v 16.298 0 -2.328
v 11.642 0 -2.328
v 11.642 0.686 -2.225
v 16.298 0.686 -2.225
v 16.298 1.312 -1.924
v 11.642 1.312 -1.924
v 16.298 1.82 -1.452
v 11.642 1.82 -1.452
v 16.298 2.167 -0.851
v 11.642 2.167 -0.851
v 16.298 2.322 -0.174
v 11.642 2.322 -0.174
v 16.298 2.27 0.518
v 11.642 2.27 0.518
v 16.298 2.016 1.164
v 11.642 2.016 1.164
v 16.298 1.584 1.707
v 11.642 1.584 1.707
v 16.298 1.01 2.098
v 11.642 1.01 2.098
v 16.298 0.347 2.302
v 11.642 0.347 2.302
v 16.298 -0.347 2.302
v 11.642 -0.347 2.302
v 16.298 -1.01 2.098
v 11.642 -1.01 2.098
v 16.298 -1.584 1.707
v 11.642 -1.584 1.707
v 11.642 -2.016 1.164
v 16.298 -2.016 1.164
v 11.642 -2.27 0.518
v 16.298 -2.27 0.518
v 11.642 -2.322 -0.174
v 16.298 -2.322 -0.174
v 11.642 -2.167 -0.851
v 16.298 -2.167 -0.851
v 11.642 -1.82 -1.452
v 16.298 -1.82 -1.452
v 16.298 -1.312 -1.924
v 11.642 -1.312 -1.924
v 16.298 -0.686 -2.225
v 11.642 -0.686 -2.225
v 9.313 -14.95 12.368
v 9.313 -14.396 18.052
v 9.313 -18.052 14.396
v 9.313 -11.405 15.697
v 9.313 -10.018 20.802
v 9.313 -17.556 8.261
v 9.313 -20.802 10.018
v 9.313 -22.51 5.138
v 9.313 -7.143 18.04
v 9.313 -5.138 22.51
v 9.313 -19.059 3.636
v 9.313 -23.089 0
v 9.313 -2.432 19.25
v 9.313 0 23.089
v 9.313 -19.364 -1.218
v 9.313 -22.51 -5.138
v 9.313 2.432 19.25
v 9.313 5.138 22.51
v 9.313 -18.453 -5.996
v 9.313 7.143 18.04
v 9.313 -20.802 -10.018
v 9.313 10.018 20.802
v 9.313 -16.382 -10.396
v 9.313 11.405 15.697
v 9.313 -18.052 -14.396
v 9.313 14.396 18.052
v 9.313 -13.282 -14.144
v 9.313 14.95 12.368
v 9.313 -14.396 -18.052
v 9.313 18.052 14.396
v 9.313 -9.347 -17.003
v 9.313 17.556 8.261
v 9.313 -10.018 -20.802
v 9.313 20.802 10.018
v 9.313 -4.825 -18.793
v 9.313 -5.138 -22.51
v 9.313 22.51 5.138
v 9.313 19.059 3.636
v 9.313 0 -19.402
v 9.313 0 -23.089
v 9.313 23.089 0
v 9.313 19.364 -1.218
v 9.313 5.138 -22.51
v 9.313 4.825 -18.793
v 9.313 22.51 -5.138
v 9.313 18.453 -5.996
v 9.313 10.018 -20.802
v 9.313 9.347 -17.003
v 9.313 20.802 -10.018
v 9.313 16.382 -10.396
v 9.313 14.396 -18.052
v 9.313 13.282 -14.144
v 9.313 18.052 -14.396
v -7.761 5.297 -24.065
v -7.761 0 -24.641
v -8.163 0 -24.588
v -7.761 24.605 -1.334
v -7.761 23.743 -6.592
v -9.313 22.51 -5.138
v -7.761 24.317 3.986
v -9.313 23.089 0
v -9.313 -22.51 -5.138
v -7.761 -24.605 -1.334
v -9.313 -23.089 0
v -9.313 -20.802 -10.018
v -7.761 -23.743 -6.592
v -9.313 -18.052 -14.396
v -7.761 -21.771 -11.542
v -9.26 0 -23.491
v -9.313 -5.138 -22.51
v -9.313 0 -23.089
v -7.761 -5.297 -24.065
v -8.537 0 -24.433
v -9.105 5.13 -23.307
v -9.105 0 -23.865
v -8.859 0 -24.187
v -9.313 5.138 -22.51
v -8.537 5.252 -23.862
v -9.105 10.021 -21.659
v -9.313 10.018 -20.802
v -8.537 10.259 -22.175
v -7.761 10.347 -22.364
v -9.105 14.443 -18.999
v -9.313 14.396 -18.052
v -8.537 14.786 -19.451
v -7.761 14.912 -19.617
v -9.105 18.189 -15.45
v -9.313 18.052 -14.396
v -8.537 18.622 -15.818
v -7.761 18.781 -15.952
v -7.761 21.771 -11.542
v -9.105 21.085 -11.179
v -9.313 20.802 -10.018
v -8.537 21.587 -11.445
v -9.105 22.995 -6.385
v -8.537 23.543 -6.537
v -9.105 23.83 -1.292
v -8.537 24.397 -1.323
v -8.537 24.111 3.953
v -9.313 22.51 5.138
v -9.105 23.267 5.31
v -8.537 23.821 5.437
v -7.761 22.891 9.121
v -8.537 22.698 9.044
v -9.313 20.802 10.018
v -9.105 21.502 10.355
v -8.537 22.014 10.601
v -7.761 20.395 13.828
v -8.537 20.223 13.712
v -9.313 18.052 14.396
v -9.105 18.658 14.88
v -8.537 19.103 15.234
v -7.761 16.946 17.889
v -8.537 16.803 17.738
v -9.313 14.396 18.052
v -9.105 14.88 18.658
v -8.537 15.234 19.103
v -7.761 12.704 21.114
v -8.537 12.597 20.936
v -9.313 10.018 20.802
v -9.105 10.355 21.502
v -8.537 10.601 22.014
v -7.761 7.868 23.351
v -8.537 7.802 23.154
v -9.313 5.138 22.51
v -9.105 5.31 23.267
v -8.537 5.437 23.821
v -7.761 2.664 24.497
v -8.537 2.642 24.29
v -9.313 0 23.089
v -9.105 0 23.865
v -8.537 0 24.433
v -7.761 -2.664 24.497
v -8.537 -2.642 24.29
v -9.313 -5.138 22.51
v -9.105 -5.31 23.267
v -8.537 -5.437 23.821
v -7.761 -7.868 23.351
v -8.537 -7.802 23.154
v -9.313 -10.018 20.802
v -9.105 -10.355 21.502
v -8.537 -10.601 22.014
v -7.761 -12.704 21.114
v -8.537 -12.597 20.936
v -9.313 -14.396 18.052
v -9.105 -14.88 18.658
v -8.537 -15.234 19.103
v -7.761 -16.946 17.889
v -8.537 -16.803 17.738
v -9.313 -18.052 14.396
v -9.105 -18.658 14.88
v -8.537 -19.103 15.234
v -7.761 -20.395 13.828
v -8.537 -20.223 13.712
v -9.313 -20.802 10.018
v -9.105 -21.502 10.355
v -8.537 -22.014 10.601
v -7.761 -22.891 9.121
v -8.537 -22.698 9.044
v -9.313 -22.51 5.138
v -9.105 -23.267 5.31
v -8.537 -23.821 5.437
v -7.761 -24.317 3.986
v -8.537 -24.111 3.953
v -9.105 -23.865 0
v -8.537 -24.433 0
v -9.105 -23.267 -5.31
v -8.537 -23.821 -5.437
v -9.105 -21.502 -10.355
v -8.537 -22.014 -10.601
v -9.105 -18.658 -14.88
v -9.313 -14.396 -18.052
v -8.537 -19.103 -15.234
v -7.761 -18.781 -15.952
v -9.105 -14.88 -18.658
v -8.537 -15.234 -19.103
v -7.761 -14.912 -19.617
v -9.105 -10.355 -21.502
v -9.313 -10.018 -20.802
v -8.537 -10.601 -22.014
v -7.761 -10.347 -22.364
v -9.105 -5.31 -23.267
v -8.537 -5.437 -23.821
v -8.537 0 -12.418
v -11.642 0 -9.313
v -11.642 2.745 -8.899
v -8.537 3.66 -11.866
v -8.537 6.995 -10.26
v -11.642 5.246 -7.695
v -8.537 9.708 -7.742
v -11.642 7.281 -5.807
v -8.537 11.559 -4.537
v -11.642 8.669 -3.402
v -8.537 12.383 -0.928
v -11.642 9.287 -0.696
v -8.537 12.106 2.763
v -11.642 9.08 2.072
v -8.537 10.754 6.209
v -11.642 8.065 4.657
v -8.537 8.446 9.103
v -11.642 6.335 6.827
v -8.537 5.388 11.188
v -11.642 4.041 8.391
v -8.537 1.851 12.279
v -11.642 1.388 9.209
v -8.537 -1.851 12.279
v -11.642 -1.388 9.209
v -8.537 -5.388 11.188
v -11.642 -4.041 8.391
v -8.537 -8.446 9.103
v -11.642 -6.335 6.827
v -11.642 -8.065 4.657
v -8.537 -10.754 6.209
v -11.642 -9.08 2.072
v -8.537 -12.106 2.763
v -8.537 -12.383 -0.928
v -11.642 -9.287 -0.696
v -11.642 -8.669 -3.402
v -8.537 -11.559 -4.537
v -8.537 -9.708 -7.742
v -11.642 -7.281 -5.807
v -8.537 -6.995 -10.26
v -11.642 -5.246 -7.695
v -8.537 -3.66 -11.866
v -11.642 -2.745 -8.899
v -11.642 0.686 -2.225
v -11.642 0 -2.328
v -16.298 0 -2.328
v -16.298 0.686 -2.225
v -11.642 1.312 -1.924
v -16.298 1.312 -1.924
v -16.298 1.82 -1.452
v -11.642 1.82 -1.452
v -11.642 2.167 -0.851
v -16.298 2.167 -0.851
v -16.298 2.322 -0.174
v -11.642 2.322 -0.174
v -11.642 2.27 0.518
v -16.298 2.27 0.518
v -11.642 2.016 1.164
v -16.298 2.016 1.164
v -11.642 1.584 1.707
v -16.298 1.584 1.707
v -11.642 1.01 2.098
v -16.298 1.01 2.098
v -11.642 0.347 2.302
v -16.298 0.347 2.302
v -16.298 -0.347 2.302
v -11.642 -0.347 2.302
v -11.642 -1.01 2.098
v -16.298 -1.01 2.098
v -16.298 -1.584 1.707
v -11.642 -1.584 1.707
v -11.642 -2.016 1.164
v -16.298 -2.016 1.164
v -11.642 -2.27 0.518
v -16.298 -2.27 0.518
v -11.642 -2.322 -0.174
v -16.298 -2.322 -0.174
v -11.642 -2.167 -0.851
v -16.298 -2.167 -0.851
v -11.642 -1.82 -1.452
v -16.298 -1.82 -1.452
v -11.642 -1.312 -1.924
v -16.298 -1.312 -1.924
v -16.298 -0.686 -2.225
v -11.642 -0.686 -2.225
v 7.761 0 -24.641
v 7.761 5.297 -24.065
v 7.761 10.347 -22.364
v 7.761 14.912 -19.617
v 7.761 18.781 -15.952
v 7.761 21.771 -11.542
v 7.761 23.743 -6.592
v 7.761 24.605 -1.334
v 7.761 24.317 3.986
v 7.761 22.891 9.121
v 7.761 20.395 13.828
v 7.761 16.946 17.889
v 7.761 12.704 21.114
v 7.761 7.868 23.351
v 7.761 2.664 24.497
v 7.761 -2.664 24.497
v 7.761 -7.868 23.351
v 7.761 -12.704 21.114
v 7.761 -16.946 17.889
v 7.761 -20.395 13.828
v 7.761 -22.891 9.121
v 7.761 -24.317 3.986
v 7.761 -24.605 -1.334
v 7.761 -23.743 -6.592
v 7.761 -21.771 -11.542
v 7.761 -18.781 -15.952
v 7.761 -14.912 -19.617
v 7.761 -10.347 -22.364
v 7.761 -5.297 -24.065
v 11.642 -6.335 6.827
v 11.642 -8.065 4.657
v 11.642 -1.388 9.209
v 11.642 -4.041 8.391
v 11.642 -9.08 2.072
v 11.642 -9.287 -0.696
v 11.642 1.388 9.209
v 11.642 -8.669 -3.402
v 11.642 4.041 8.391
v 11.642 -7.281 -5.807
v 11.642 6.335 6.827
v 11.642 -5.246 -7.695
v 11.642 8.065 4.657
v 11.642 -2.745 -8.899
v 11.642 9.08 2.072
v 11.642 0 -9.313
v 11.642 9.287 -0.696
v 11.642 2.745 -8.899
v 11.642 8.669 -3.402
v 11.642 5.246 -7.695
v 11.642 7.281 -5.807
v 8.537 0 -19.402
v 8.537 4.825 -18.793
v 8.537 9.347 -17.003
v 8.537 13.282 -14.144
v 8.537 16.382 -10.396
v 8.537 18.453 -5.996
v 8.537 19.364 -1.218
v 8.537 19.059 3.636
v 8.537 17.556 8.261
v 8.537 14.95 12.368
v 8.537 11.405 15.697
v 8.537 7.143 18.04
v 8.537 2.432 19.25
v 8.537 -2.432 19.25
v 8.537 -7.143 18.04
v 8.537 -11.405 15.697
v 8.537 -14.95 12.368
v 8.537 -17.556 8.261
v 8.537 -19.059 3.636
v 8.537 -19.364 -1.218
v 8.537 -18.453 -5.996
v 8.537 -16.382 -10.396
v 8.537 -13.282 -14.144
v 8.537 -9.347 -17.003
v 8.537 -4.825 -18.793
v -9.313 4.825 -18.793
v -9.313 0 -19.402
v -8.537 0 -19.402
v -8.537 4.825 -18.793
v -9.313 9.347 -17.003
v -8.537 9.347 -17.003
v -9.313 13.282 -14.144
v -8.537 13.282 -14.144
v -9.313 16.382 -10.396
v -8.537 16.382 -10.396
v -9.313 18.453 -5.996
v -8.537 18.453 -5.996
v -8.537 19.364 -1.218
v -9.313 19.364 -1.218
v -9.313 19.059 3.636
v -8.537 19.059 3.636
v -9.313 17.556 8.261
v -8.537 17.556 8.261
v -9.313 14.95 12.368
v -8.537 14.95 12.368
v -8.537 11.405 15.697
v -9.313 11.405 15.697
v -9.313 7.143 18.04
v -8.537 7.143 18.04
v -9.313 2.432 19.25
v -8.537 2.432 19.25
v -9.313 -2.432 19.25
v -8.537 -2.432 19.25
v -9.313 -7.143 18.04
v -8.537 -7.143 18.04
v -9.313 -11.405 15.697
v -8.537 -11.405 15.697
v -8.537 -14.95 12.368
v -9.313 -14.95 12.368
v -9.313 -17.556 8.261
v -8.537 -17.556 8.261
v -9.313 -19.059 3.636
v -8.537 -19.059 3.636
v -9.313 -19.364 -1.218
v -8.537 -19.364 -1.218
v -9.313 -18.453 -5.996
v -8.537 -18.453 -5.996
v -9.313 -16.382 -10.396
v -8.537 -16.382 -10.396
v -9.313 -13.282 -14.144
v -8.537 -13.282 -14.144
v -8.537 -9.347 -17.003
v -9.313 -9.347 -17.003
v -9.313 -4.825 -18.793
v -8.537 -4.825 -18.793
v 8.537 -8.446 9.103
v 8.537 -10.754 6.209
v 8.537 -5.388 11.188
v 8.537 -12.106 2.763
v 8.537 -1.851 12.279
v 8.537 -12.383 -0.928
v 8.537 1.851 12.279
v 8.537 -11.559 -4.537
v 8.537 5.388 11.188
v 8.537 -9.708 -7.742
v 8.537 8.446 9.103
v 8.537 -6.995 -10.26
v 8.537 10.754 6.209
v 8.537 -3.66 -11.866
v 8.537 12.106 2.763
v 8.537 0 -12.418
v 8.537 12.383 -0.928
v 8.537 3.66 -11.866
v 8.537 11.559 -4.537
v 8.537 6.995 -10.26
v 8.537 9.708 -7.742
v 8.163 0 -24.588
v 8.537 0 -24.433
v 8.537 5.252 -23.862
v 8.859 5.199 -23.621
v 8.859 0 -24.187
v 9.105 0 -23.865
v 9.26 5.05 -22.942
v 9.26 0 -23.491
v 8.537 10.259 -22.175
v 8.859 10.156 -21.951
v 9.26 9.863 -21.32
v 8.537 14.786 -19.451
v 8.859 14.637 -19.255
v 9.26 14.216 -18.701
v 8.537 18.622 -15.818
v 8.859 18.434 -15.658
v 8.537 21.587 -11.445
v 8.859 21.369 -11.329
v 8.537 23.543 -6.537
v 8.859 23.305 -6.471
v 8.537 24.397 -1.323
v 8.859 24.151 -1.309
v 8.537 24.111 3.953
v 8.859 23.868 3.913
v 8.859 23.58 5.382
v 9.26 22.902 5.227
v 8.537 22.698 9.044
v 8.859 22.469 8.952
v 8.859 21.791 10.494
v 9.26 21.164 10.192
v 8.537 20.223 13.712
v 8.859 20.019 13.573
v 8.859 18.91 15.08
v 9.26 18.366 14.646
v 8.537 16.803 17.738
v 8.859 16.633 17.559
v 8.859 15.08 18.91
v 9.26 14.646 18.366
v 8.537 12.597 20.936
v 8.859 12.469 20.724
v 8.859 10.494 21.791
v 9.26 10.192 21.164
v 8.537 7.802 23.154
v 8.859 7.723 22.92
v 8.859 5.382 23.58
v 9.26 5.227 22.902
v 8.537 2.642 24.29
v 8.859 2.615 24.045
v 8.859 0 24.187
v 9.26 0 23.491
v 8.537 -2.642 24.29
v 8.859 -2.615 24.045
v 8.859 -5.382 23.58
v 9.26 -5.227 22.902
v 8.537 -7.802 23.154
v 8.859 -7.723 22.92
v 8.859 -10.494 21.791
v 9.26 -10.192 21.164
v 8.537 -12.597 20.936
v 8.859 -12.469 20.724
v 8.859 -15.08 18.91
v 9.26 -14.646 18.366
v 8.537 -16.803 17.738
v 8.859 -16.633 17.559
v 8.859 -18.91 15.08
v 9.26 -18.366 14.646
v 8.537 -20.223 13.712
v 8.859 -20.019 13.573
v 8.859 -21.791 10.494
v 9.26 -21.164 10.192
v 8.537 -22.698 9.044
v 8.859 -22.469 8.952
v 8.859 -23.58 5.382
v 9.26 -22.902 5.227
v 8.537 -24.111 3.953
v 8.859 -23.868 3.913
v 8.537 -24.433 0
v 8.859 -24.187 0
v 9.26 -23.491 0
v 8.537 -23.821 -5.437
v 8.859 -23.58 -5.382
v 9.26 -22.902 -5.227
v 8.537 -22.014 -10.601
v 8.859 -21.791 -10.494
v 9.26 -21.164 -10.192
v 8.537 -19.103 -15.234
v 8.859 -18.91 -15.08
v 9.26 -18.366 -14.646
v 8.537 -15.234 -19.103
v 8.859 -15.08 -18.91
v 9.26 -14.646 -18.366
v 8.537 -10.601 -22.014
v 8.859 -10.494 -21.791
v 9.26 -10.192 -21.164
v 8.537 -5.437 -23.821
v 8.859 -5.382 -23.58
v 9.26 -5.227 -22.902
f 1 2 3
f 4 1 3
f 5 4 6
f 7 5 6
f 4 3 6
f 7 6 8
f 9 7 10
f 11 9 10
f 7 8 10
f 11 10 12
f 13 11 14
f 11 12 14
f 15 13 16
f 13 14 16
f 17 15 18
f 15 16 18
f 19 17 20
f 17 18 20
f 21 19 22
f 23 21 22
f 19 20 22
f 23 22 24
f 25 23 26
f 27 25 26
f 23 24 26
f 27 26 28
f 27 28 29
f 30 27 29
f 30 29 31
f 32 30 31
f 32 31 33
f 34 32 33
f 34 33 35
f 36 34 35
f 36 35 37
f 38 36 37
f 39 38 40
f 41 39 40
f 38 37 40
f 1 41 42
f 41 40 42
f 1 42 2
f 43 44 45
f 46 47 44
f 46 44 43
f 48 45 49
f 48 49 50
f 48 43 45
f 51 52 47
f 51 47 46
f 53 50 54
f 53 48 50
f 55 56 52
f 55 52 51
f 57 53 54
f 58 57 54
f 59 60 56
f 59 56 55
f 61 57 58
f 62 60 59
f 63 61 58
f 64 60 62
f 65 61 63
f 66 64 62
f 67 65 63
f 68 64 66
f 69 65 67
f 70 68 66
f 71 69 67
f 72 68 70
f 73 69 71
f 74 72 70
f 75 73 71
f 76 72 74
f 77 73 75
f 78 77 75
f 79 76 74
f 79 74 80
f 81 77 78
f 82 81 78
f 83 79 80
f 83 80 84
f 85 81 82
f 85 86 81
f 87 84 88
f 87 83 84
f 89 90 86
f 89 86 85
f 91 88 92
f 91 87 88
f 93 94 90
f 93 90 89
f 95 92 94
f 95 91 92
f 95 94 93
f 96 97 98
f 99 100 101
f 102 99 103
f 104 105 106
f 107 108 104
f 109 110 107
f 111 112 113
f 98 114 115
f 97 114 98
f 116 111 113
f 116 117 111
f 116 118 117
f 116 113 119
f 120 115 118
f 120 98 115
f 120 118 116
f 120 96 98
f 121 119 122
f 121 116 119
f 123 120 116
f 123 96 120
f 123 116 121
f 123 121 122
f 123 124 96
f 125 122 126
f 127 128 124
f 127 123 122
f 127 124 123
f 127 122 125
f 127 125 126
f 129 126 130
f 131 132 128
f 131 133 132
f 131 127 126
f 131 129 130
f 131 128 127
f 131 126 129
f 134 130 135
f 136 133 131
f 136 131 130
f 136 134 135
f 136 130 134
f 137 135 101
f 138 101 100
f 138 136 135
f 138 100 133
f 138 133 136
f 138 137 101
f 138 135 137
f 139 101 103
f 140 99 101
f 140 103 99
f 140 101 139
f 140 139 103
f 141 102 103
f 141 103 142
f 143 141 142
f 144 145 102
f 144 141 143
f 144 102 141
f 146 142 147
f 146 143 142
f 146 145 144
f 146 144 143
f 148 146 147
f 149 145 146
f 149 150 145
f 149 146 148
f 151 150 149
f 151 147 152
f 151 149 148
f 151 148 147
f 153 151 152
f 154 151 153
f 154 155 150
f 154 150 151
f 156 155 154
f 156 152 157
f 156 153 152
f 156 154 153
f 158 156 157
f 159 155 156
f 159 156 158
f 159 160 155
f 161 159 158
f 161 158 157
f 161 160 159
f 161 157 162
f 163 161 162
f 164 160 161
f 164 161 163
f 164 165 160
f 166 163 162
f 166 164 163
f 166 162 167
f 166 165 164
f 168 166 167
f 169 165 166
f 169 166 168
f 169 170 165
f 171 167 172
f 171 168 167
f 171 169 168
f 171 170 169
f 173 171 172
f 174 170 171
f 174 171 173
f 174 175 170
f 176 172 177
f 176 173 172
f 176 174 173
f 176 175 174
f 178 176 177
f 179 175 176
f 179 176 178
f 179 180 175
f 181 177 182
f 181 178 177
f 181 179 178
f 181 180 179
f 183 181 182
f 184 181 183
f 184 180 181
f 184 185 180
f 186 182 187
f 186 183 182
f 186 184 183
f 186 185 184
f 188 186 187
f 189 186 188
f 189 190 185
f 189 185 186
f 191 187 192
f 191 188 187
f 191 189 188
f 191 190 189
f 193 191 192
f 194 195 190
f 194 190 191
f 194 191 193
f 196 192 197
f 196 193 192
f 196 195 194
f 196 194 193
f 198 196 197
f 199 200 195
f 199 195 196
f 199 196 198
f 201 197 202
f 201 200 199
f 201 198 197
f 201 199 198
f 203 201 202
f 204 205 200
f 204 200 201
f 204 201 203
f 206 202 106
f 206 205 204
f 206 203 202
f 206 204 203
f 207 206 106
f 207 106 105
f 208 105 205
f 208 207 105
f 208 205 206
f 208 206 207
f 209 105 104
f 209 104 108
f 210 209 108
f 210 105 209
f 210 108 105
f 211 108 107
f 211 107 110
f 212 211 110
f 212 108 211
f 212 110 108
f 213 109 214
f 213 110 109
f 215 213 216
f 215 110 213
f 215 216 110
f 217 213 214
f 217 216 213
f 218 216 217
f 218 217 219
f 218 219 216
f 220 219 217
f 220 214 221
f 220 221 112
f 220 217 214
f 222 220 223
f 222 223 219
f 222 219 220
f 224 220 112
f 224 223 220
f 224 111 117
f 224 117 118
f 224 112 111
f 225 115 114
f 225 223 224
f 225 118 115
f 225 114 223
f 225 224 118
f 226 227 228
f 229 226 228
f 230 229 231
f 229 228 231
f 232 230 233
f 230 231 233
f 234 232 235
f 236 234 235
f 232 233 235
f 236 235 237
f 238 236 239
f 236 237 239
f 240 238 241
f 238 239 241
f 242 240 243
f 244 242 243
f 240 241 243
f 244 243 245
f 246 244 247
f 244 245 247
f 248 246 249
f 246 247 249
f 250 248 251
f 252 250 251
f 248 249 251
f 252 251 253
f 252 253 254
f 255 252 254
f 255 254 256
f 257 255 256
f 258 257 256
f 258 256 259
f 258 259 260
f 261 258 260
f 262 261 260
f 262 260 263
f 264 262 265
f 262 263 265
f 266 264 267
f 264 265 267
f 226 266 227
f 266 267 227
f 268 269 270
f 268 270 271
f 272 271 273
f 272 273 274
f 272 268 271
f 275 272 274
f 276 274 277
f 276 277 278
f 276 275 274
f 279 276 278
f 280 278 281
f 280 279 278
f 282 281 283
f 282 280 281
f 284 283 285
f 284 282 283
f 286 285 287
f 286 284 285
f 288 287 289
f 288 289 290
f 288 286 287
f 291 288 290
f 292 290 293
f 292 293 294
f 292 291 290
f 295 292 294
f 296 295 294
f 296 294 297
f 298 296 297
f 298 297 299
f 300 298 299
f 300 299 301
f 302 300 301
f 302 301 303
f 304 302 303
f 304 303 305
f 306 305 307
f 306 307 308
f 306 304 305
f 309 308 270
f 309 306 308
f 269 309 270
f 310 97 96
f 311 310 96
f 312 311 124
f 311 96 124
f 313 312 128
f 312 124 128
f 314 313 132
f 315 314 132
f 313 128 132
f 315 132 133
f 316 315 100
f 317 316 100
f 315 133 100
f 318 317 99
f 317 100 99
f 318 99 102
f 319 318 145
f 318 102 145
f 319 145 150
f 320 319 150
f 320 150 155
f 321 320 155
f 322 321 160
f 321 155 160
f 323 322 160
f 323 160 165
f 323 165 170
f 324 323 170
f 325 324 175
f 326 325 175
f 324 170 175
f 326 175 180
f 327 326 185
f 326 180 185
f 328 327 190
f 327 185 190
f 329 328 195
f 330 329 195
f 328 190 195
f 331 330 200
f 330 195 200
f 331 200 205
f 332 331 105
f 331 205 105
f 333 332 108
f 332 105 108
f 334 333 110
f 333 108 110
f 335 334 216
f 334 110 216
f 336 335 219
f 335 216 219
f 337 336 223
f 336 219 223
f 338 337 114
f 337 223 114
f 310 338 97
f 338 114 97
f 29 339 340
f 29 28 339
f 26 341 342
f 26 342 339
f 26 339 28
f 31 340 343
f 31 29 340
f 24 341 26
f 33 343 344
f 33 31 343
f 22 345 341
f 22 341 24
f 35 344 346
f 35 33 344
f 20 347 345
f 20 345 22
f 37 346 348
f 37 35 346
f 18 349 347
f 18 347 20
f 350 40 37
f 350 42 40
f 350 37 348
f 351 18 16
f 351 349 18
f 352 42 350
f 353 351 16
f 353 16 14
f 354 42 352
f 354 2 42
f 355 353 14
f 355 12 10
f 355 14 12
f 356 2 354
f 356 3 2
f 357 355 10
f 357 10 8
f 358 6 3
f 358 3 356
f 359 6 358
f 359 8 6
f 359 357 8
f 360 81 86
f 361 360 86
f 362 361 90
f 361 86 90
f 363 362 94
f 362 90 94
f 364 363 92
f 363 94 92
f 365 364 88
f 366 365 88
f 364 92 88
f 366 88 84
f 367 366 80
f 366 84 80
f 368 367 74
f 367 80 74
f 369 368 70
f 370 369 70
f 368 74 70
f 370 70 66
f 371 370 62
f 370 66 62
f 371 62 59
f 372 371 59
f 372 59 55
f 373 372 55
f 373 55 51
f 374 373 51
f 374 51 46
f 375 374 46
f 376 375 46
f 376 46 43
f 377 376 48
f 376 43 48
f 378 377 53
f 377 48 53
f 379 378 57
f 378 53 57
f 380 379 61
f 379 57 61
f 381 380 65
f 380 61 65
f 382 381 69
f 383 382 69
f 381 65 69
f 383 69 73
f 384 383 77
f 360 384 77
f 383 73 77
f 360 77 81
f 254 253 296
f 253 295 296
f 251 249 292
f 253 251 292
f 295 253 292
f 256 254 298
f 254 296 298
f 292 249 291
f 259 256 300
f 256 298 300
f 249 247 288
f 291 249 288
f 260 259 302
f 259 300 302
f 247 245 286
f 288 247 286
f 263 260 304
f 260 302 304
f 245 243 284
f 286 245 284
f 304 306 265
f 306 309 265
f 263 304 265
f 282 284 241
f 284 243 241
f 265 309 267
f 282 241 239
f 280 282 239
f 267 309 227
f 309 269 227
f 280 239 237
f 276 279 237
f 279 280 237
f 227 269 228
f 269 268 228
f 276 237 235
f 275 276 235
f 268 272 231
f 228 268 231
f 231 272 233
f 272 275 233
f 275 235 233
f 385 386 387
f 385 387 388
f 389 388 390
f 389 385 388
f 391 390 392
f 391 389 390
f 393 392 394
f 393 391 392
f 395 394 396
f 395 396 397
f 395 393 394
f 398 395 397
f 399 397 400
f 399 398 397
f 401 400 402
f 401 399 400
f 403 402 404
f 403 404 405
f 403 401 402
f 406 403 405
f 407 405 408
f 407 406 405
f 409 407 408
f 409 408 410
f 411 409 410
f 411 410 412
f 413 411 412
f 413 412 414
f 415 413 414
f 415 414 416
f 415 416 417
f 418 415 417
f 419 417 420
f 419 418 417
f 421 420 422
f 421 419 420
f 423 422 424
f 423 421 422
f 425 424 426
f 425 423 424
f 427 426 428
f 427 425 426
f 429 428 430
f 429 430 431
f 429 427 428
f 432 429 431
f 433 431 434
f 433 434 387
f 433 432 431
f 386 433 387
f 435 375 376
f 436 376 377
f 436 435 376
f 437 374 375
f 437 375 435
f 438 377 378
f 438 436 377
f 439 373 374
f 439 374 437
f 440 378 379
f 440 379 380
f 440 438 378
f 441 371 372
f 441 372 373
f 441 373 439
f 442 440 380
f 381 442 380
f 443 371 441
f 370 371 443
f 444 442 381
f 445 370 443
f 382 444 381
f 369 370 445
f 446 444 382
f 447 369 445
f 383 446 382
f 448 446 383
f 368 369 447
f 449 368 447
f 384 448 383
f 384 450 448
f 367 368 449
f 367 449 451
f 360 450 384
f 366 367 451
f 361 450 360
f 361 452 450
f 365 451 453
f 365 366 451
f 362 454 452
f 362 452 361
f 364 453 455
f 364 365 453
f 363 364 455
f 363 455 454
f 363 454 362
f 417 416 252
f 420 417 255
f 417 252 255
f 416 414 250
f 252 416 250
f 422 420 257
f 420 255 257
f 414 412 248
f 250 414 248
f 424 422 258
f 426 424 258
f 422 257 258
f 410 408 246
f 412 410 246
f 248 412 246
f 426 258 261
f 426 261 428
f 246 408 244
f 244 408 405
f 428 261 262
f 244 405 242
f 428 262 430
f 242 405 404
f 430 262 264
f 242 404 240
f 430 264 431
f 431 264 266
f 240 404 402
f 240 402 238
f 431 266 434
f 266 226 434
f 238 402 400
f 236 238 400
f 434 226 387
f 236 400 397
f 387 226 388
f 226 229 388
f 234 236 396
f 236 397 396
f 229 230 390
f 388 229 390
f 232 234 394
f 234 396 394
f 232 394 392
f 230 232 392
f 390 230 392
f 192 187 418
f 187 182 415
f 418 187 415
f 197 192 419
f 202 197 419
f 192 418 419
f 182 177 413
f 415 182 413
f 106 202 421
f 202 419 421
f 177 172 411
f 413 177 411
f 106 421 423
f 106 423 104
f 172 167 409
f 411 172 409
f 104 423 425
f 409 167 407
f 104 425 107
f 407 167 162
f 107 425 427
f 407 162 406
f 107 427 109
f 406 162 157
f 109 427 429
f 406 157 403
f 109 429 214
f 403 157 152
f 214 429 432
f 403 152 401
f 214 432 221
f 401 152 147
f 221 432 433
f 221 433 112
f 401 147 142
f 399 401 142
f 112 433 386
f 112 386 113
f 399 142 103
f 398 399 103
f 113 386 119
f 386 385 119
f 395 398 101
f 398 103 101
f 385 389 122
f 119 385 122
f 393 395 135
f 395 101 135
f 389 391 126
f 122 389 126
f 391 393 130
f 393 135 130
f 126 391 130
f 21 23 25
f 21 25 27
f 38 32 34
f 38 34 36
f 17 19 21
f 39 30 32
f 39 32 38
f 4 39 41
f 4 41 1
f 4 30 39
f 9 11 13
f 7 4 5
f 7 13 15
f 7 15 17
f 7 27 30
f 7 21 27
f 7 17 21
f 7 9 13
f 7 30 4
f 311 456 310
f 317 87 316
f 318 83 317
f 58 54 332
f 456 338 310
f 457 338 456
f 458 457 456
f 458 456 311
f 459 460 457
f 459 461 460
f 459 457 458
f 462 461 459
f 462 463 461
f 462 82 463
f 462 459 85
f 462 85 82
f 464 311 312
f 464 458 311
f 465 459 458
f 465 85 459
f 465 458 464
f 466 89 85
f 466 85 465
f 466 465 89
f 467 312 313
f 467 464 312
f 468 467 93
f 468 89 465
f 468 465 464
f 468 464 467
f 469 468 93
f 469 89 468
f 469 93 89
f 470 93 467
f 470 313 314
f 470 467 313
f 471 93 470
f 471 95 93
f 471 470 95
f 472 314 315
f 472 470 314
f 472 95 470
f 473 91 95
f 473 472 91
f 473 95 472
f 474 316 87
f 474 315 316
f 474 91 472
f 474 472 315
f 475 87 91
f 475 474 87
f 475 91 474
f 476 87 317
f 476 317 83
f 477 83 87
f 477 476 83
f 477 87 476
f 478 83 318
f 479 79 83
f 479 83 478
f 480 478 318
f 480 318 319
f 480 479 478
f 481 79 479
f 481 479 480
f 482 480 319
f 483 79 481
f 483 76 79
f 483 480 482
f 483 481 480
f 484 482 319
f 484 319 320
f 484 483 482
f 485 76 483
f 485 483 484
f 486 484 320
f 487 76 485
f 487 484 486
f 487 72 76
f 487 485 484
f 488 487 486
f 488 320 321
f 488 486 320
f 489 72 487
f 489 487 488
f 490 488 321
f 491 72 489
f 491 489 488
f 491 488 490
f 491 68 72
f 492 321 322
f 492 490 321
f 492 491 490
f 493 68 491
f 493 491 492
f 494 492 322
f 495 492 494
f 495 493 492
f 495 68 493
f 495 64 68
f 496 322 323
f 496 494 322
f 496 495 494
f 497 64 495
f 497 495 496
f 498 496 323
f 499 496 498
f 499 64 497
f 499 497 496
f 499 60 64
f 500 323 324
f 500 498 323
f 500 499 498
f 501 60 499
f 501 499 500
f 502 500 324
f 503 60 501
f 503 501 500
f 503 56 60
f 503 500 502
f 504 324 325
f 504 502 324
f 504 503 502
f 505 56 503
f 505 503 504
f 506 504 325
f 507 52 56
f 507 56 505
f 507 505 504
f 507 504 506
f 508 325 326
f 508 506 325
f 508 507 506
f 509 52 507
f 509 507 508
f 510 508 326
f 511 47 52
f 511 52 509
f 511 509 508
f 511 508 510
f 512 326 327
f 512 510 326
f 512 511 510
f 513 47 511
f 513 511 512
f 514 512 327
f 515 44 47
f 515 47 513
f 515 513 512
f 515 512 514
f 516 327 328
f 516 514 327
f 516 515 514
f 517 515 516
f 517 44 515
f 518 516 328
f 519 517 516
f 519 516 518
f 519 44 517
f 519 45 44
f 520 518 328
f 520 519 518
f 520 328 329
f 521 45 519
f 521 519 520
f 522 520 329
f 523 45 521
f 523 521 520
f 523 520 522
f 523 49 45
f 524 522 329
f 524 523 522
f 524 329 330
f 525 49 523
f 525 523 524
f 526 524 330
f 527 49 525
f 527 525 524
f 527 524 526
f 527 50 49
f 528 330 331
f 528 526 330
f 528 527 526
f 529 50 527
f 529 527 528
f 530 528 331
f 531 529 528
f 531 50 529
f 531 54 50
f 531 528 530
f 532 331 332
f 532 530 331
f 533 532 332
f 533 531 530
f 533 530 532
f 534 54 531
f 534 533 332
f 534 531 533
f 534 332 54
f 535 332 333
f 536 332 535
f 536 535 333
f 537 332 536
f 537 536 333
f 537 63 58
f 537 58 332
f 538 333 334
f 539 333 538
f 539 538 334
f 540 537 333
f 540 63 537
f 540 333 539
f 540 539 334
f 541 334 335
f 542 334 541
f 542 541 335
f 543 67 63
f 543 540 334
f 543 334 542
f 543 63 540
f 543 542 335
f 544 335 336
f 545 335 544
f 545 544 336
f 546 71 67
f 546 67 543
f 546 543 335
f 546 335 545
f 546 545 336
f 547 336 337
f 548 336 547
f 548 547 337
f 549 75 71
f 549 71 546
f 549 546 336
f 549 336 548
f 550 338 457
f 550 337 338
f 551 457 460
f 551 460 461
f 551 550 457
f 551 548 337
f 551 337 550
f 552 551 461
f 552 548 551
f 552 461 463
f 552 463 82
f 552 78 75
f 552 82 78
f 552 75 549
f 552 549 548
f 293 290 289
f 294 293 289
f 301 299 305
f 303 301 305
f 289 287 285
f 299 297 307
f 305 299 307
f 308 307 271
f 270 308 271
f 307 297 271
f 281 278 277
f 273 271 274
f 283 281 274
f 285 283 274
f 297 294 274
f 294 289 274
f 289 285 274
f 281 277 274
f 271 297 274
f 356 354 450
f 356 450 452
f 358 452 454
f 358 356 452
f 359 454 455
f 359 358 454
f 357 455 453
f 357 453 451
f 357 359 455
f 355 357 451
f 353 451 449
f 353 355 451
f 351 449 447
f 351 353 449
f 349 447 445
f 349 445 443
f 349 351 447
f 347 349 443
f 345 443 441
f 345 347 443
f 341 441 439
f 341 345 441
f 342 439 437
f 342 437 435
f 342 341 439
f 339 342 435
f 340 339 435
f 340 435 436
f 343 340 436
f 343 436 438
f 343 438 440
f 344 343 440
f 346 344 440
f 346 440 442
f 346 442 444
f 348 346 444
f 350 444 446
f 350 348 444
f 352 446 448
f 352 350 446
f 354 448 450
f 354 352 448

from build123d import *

# Parameters (mm, degrees)
BOSS_EXTRUDE1_DEPTH      = 12
BOSS_EXTRUDE1_DEPTH_BACK = 12
SKETCH1_R                = 31.75
SKETCH2_R                = 25
SKETCH2_R_2              = 16
CUT_EXTRUDE1_DEPTH       = 1
BOSS_EXTRUDE2_START      = 3
SKETCH3_R                = 16
BOSS_EXTRUDE2_DEPTH      = 3
CHAMFER2_SIZE            = 4
FILLET1_R                = 2
SKETCH4_R                = 3
BOSS_EXTRUDE3_DEPTH      = 6
SCALE1_SCALE             = 0.7761


with BuildPart() as part:
    # Sketch1 → Boss-Extrude1 (new, two sides: drawn at the far end of the back side and taken through both)
    with BuildSketch(Plane(origin=(0, 0, 0), x_dir=(0, 0, -1), z_dir=(1, 0, 0)).offset(-BOSS_EXTRUDE1_DEPTH_BACK)):
        Circle(SKETCH1_R)
    extrude(amount=BOSS_EXTRUDE1_DEPTH + BOSS_EXTRUDE1_DEPTH_BACK)

    # Sketch2 → Cut-Extrude1 (cut)
    with BuildSketch(Plane(origin=(12, 0, 0), x_dir=(0, 0, -1), z_dir=(1, 0, 0))):
        Circle(SKETCH2_R)
        Circle(SKETCH2_R_2, mode=Mode.SUBTRACT)
    cut_extrude1 = extrude(amount=-CUT_EXTRUDE1_DEPTH, mode=Mode.SUBTRACT)

    # Sketch3 → Boss-Extrude2 (add)
    with BuildSketch(Plane(origin=(12, 0, 0), x_dir=(0, 0, -1), z_dir=(1, 0, 0)).offset(BOSS_EXTRUDE2_START)):
        Circle(SKETCH3_R)
    boss_extrude2 = extrude(amount=-BOSS_EXTRUDE2_DEPTH)

    # Mirror1: Cut-Extrude1, Boss-Extrude2 across plane
    add(cut_extrude1.mirror(Plane(origin=(0, 0, 0), x_dir=(0, 0, 1), z_dir=(1, 0, 0))), mode=Mode.SUBTRACT)
    add(boss_extrude2.mirror(Plane(origin=(0, 0, 0), x_dir=(0, 0, 1), z_dir=(1, 0, 0))))

    # Chamfer2
    # the kernel refuses this chamfer: 4 mm, written as the material it takes off along each edge
    with BuildSketch(Plane(origin=(15, 0, 0), x_dir=(0, 0, -1), z_dir=(0, -1, 0))) as chamfer2_piece_1_section:
        Polygon((16, -CHAMFER2_SIZE), (16 - CHAMFER2_SIZE, 0), (16, 0), align=None)
    chamfer2_piece_1 = revolve(axis=Axis((15, 0, 0), (1, 0, 0)), mode=Mode.PRIVATE)
    chamfer2_piece_1 = split(chamfer2_piece_1, bisect_by=Plane(origin=(11, 0, 14.009360732), z_dir=(1, 0, 0)), keep=Keep.TOP, mode=Mode.PRIVATE)
    add(chamfer2_piece_1, mode=Mode.SUBTRACT)
    with BuildSketch(Plane(origin=(-15, 0, 0), x_dir=(0, 0, -1), z_dir=(0, -1, 0))) as chamfer2_piece_2_section:
        Polygon((16, CHAMFER2_SIZE), (16 - CHAMFER2_SIZE, 0), (16, 0), align=None)
    chamfer2_piece_2 = revolve(axis=Axis((-15, 0, 0), (1, 0, 0)), mode=Mode.PRIVATE)
    chamfer2_piece_2 = split(chamfer2_piece_2, bisect_by=Plane(origin=(-11, 0, 14.009360732), z_dir=(-1, 0, 0)), keep=Keep.TOP, mode=Mode.PRIVATE)
    add(chamfer2_piece_2, mode=Mode.SUBTRACT)

    # Fillet1
    fillet1_edges = [part.edges().sort_by_distance(p)[0] for p in [
        (-12, 0, 31.75),
        (12, 0, 31.75),
    ]]
    fillet(fillet1_edges, radius=FILLET1_R)

    # Sketch4 → Boss-Extrude3 (add)
    with BuildSketch(Plane(origin=(15, 0, 0), x_dir=(0, 0, -1), z_dir=(1, 0, 0))):
        Circle(SKETCH4_R)
    boss_extrude3 = extrude(amount=BOSS_EXTRUDE3_DEPTH)

    # Mirror2: Boss-Extrude3 across plane
    add(boss_extrude3.mirror(Plane(origin=(0, 0, 0), x_dir=(0, 0, 1), z_dir=(1, 0, 0))))


with BuildPart() as part_1:
    # Scale1: scaled about (0, 0, 0)
    add(part.part.scale(SCALE1_SCALE))


solid = part_1.part
